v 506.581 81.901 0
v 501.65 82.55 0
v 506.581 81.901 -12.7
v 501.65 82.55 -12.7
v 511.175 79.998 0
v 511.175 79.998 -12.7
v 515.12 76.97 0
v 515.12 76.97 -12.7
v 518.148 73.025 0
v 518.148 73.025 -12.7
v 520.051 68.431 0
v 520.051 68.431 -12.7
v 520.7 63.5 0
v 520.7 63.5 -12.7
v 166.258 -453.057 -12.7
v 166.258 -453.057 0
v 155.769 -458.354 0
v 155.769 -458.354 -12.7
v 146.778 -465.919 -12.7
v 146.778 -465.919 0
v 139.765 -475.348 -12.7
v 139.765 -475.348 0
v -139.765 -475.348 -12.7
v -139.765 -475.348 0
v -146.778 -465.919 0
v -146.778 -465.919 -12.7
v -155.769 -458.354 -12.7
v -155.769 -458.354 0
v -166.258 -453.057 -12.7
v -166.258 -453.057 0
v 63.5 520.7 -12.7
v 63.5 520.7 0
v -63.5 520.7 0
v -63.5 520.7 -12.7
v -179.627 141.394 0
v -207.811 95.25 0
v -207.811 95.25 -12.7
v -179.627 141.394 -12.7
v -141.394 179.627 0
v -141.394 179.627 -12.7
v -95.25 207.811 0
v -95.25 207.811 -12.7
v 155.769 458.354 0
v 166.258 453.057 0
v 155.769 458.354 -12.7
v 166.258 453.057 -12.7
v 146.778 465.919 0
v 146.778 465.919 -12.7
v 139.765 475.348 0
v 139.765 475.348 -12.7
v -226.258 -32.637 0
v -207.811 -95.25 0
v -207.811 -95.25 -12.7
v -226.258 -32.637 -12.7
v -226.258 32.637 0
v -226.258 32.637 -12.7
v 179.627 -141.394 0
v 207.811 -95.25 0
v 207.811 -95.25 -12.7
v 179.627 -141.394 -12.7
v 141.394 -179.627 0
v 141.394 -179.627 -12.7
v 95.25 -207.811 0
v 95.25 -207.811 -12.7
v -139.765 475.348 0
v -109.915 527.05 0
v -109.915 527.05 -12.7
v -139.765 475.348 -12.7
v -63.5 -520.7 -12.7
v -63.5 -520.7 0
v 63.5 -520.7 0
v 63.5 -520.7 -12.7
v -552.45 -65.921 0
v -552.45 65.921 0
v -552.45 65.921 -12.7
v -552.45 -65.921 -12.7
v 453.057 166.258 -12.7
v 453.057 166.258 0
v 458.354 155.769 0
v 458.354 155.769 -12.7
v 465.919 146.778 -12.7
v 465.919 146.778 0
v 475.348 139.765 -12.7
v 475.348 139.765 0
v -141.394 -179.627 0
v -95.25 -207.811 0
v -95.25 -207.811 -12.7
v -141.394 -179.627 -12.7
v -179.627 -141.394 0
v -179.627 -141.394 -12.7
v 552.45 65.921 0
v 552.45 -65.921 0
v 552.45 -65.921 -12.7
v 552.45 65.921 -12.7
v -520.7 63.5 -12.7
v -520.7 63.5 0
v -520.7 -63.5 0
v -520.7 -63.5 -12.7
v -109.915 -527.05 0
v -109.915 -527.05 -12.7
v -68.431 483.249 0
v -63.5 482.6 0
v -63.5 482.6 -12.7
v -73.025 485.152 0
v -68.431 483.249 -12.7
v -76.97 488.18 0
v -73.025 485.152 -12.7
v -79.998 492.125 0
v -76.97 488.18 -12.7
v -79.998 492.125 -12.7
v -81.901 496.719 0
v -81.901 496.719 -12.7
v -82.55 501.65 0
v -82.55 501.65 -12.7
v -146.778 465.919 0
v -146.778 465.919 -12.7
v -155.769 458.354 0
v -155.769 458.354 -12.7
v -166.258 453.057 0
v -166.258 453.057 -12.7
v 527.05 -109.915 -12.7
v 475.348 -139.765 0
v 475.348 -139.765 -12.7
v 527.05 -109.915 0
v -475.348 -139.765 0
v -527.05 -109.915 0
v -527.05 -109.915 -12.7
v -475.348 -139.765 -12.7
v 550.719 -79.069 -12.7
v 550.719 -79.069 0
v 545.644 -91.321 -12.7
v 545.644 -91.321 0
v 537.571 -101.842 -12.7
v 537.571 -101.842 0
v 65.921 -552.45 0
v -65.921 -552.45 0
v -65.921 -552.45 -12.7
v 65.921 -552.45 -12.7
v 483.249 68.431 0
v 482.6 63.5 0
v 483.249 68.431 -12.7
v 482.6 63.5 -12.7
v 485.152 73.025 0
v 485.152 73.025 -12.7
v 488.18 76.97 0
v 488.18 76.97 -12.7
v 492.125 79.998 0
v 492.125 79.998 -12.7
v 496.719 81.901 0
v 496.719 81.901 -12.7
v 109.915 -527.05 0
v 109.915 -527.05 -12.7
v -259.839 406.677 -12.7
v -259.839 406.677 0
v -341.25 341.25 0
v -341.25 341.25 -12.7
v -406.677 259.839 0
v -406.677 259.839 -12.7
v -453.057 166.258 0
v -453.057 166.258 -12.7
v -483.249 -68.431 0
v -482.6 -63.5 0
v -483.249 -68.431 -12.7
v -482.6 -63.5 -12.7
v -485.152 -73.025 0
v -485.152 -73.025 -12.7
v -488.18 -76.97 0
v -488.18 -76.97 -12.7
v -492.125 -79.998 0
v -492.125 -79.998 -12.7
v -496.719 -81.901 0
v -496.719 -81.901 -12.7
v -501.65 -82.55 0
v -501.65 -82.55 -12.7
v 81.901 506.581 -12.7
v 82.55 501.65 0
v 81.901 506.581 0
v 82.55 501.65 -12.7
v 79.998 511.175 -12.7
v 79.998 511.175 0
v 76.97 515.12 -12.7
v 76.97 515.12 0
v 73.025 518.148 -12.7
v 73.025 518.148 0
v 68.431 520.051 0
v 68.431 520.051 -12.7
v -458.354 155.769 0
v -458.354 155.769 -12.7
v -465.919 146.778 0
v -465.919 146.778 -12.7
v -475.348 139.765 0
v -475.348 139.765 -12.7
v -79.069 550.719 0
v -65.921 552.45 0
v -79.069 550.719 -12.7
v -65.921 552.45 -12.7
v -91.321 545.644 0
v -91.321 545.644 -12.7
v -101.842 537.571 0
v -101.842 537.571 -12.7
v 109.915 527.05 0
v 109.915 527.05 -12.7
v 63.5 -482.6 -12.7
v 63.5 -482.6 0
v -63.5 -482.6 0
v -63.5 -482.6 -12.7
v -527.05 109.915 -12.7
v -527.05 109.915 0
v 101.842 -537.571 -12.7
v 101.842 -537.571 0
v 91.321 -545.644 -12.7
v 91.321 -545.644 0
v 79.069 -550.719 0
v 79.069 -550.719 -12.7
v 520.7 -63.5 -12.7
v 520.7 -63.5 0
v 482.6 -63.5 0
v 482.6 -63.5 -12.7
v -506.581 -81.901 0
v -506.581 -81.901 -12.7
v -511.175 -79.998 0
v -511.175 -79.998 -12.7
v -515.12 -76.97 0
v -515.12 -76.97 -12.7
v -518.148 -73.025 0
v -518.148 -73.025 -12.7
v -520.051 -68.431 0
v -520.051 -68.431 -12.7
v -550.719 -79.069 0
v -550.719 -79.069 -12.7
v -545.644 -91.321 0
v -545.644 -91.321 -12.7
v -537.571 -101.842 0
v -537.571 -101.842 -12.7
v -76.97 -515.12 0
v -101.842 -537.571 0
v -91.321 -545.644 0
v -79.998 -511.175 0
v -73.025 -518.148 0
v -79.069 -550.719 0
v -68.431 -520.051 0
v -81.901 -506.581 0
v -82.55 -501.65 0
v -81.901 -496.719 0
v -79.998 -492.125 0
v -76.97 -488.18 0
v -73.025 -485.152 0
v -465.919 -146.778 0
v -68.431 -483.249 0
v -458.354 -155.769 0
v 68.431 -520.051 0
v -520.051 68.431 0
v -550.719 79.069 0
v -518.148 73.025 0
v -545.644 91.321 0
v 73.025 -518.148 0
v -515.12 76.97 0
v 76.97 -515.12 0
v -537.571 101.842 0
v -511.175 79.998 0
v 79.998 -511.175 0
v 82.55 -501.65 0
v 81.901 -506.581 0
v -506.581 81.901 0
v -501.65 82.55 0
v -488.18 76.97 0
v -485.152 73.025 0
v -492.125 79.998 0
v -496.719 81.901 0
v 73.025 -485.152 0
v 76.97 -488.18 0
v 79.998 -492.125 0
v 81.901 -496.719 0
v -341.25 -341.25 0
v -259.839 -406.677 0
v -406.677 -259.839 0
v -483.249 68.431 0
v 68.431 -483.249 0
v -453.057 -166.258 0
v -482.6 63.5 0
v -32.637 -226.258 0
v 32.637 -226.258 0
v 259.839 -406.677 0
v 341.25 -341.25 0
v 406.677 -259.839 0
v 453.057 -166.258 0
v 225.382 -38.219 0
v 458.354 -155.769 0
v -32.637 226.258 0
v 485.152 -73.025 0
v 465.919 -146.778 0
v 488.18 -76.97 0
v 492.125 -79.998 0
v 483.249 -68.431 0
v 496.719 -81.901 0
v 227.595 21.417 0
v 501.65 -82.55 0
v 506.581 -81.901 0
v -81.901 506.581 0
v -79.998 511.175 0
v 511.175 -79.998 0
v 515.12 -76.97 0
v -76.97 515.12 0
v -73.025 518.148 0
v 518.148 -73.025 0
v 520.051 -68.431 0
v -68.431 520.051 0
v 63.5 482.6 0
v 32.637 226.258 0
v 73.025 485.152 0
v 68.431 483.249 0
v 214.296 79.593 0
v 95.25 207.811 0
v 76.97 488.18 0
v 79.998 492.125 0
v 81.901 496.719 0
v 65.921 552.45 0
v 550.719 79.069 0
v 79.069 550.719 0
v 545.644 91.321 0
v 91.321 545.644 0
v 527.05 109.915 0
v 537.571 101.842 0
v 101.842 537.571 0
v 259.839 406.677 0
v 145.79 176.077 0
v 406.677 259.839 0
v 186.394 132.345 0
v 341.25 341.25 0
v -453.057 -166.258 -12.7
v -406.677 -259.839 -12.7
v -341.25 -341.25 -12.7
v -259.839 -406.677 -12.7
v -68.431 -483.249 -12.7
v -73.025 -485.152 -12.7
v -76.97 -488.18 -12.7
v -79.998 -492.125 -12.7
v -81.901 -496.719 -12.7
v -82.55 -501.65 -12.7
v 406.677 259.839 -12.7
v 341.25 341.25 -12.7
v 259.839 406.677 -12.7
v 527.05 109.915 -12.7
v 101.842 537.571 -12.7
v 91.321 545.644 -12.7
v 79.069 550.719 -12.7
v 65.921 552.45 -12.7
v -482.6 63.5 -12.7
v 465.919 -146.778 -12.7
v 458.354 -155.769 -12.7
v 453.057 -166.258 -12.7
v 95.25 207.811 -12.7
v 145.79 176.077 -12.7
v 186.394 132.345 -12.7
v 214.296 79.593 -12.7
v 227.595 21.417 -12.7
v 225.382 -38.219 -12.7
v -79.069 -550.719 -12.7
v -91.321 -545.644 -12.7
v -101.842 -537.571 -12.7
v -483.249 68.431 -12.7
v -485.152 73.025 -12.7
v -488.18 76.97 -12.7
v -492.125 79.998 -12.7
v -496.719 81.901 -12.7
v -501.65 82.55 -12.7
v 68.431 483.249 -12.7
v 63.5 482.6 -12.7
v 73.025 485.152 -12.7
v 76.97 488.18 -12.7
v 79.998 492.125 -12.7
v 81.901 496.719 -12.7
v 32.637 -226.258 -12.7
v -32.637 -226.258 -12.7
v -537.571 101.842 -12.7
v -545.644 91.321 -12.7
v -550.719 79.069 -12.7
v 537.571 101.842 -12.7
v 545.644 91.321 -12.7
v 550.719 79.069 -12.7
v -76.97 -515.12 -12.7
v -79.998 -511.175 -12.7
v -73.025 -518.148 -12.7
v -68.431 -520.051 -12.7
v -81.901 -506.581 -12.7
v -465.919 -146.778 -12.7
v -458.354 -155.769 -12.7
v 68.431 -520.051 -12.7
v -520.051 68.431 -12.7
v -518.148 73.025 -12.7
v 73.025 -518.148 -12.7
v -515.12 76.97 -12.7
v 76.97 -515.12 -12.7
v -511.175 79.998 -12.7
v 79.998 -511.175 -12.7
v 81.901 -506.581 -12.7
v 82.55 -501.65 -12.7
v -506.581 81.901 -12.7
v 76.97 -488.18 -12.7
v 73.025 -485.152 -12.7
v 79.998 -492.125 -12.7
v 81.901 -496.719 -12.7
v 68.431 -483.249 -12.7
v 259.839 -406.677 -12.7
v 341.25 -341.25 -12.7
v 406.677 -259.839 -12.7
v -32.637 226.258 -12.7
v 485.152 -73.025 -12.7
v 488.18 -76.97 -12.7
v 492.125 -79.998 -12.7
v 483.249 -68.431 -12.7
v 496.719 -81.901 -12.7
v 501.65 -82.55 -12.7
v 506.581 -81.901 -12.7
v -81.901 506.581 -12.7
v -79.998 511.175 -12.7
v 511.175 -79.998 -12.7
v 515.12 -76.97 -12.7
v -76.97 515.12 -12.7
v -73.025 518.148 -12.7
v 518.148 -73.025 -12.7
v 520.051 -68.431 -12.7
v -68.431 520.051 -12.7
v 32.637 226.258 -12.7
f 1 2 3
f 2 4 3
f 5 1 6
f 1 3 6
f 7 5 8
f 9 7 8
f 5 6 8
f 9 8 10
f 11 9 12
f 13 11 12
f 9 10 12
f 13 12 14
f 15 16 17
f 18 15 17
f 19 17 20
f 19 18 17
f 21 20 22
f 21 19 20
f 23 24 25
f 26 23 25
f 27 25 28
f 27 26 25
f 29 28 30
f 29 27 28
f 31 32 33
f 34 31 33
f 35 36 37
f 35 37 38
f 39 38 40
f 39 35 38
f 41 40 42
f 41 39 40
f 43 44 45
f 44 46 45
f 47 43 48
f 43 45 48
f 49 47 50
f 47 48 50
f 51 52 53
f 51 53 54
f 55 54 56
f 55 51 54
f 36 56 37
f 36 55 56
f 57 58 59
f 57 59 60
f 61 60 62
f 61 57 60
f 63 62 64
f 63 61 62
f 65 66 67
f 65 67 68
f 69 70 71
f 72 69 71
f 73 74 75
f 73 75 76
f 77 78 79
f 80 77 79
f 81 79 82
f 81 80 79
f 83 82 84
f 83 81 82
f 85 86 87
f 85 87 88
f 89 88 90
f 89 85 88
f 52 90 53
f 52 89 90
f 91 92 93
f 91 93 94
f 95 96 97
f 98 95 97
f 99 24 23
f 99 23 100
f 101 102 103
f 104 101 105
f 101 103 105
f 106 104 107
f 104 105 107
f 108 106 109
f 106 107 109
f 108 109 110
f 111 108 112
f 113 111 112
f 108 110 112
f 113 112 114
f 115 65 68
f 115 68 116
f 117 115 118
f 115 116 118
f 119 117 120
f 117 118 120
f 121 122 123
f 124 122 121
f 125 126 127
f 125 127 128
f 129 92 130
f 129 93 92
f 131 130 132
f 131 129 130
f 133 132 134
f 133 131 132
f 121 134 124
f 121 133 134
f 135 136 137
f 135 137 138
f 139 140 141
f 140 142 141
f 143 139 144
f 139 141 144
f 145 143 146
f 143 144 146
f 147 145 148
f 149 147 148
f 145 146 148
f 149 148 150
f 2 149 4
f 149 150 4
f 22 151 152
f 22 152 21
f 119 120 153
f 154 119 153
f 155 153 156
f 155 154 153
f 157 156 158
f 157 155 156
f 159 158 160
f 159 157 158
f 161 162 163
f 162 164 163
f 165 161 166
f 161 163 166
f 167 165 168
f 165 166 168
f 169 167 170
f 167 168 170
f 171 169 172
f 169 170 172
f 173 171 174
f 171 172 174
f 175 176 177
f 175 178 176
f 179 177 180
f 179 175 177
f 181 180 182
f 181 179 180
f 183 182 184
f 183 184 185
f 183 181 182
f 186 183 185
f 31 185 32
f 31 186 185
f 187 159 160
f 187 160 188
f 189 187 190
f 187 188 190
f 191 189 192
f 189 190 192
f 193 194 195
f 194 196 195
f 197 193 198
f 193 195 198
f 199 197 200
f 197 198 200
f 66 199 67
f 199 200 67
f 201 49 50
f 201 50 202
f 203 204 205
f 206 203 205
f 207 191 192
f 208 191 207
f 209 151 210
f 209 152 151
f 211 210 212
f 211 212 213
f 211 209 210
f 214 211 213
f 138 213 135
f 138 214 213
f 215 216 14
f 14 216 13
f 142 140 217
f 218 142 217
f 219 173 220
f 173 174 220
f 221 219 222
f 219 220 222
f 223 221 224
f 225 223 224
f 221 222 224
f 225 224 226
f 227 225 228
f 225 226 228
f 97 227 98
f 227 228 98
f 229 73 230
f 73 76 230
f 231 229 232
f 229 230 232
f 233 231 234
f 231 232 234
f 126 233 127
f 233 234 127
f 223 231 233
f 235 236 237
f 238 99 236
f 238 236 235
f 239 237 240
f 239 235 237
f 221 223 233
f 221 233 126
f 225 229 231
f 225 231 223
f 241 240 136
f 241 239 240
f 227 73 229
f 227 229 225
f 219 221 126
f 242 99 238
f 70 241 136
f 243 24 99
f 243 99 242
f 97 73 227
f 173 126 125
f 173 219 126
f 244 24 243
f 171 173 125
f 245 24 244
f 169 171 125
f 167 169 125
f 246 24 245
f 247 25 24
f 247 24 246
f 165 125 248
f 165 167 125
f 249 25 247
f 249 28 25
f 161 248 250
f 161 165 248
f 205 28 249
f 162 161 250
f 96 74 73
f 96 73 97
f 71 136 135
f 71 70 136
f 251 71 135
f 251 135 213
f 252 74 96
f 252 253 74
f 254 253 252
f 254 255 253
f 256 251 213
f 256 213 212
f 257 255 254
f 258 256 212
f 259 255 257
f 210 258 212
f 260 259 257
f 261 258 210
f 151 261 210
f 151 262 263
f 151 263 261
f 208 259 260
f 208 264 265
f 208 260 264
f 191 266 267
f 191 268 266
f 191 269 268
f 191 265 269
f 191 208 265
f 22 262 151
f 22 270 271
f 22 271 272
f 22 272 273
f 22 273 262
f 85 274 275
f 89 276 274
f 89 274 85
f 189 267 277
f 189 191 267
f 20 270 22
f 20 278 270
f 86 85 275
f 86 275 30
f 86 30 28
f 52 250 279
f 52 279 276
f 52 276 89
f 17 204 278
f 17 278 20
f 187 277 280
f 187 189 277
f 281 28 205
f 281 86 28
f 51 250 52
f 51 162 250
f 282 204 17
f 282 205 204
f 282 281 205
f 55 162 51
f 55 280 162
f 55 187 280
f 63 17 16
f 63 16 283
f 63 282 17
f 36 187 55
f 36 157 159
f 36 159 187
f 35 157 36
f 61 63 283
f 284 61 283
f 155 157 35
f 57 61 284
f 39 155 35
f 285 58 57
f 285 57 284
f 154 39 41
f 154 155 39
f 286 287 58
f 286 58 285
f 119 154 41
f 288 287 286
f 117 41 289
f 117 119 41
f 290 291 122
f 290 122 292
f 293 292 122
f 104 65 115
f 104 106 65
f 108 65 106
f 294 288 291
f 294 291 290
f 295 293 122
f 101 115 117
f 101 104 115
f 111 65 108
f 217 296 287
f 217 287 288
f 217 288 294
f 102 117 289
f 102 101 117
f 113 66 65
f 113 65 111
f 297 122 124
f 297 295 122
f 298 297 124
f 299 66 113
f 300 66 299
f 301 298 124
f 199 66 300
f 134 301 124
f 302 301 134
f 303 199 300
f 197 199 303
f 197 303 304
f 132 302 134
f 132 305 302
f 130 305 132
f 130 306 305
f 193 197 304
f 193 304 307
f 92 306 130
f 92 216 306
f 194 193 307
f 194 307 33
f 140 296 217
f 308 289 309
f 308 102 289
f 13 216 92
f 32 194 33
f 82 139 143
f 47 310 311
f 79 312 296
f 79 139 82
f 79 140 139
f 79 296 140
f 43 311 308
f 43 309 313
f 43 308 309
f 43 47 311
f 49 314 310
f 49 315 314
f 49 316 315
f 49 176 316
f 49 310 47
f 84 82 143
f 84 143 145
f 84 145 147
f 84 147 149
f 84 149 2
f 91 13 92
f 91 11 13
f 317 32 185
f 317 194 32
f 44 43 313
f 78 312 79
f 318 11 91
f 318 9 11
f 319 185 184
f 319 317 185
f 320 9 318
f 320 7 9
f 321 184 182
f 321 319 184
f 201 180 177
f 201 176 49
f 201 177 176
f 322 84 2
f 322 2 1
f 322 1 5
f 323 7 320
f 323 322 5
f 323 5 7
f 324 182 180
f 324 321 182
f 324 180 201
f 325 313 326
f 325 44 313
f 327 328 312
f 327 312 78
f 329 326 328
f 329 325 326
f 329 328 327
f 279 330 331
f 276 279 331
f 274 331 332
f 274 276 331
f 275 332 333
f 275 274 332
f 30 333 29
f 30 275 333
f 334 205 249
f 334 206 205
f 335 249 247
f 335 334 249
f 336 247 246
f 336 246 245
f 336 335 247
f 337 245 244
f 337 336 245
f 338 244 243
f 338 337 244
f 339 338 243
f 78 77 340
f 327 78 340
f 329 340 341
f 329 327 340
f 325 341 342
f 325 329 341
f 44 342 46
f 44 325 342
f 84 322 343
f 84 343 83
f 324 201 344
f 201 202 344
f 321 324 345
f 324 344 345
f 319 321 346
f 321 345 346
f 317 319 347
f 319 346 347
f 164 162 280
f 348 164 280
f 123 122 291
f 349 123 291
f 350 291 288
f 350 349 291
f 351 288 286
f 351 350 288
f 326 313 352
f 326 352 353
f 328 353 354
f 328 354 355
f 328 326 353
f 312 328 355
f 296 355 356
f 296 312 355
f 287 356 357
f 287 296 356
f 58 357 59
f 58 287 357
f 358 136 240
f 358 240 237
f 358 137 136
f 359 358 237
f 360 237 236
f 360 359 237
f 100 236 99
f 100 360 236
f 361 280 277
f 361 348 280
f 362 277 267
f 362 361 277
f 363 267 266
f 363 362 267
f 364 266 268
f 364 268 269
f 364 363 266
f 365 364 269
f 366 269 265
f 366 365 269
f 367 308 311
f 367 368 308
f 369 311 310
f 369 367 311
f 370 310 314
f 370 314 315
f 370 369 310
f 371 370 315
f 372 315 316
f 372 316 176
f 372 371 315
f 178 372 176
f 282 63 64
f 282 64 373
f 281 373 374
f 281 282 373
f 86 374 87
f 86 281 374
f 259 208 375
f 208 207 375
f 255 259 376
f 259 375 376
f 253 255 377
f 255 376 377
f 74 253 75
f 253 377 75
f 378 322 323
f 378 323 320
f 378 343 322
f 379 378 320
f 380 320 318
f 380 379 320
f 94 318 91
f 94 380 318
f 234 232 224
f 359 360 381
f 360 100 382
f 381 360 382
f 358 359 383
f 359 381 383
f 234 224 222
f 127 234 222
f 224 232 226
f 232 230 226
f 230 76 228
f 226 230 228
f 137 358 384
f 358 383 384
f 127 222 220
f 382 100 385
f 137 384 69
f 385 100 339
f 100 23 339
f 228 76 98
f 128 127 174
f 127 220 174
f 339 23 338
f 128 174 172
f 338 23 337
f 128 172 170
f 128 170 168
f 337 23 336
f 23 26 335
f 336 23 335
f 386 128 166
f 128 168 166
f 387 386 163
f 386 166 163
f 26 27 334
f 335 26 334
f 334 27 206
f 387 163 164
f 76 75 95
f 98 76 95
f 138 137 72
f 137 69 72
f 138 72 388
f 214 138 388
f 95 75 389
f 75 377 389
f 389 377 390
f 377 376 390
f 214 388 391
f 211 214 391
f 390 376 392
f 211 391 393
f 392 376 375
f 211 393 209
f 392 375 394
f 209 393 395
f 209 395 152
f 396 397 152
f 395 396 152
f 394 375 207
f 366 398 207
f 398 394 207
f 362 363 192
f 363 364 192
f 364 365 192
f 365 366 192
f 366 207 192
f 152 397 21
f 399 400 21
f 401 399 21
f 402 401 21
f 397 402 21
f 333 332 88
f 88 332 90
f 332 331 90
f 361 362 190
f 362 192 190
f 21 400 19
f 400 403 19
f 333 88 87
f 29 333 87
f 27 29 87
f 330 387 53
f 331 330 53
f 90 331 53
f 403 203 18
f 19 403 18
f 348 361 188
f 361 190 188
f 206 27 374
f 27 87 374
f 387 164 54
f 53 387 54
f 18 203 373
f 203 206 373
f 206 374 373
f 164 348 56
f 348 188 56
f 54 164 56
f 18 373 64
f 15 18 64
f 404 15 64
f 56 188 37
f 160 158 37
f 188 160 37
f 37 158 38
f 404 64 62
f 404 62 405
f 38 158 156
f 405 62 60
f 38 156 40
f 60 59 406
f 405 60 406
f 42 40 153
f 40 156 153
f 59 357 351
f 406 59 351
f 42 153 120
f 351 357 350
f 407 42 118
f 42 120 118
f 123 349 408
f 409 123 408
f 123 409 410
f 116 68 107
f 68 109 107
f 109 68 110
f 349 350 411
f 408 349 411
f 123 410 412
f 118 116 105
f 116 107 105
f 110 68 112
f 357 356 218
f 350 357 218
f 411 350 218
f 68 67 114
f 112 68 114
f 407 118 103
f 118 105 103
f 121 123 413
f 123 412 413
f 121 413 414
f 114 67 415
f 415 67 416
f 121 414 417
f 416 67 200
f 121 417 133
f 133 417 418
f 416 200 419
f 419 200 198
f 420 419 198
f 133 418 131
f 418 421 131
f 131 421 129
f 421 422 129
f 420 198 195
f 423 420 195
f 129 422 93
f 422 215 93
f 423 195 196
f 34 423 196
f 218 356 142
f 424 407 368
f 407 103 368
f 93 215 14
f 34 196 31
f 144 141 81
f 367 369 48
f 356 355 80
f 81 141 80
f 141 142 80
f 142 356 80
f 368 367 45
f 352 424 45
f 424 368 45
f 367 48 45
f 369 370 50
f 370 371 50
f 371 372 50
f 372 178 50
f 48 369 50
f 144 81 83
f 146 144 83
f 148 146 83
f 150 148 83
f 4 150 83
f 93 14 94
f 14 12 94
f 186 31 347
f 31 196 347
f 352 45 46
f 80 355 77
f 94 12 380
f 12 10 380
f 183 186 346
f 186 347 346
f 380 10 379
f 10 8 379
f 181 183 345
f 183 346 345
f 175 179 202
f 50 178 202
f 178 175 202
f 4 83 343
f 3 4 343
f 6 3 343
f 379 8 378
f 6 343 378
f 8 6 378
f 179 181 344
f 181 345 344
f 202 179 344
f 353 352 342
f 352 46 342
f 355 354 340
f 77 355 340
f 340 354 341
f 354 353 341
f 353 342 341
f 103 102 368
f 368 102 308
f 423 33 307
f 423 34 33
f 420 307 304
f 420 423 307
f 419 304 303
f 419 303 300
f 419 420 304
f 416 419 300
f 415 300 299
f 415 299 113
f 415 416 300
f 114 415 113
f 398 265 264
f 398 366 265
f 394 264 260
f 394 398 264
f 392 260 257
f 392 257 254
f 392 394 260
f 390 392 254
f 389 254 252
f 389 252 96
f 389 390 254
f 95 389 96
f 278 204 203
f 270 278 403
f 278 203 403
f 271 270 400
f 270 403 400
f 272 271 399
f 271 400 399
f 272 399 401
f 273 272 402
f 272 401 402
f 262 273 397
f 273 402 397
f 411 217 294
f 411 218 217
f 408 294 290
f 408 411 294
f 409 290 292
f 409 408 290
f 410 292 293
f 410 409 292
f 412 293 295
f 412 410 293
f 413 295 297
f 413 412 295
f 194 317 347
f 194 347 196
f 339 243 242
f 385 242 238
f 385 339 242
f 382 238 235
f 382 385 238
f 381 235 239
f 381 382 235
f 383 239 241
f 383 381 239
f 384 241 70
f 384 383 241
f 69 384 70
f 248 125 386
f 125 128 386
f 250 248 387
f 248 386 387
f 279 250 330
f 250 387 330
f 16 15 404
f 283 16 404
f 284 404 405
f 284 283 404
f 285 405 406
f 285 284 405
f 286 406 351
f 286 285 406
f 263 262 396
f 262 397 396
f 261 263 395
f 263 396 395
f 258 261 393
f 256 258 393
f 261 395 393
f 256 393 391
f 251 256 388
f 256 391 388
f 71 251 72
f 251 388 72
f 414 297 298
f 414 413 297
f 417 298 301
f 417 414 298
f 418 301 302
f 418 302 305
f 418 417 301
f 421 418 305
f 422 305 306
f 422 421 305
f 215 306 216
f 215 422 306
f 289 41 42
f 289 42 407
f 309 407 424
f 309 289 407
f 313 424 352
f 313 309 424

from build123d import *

# Parameters (mm, degrees)
F1_DEPTH        = 12.7
F2_DEPTH        = 25.4
F2_COPIES_COUNT = 4
F3_R            = 19.04999
F5_R            = 50.8


# Not quite as in the source:
# - a fillet or chamfer is up to 0.001 mm smaller than in the source, because OpenCascade refuses the exact size
# - a feature of the source that left no trace in its solid (it failed there, or was rolled back) is left out
# - a pattern or mirror of a feature is missing from the dataset's text; its kind, count and spacing are read off the source's solid


with BuildPart() as f1:
    # F0 (on Top) → F1 (new body)
    with BuildSketch(Plane.XY):
        with BuildLine():
            Line((552.45, 95.25), (473.1069620075, 95.25))
            ThreePointArc((473.1069620075, 95.25), (480.2208761939, 47.8609451179), (482.6, 0))
            ThreePointArc((482.6, 0), (480.2208761939, -47.8609451179), (473.1069620075, -95.25))
            Line((473.1069620075, -95.25), (552.45, -95.25))
            Line((552.45, -95.25), (552.45, 95.25))
        make_face()
        with BuildLine():
            Line((-207.8109657838, 95.25), (-473.1069620075, 95.25))
            ThreePointArc((-473.1069620075, 95.25), (-480.2208762804, 47.8609442495), (-482.6, -1.7456e-06))
            ThreePointArc((-482.6, -1.7456e-06), (-480.2208761073, -47.8609459864), (-473.1069620075, -95.25))
            Line((-473.1069620075, -95.25), (-207.8109657838, -95.25))
            ThreePointArc((-207.8109657838, -95.25), (-228.6, 0), (-207.8109657838, 95.25))
        make_face()
        with BuildLine():
            Line((473.1069620075, 95.25), (207.8109657838, 95.25))
            ThreePointArc((207.8109657838, 95.25), (223.3422785527, 48.7461445748), (228.6, 0))
            ThreePointArc((228.6, 0), (223.3422785527, -48.7461445748), (207.8109657838, -95.25))
            Line((207.8109657838, -95.25), (473.1069620075, -95.25))
            ThreePointArc((473.1069620075, -95.25), (480.2208761939, -47.8609451179), (482.6, 0))
            ThreePointArc((482.6, 0), (480.2208761939, 47.8609451179), (473.1069620075, 95.25))
        make_face()
        with BuildLine():
            ThreePointArc((-458.9465033909, 149.2342689375), (-466.8077665522, 122.4470052167), (-473.1069620075, 95.25))
            Line((-473.1069620075, 95.25), (-207.8109657838, 95.25))
            ThreePointArc((-207.8109657838, 95.25), (-161.6446101792, 161.6446101792), (-95.25, 207.8109657838))
            Line((-95.25, 207.8109657838), (-95.25, 473.1069620075))
            ThreePointArc((-95.25, 473.1069620075), (-122.4470052167, 466.8077665522), (-149.2342689375, 458.9465033909))
            ThreePointArc((-149.2342689375, 458.9465033909), (-341.2497326006, 341.2497326006), (-458.9465033909, 149.2342689375))
        make_face()
        with BuildLine():
            Line((-95.25, 473.1069620075), (-95.25, 207.8109657838))
            ThreePointArc((-95.25, 207.8109657838), (0, 228.6), (95.25, 207.8109657838))
            Line((95.25, 207.8109657838), (95.25, 473.1069620075))
            ThreePointArc((95.25, 473.1069620075), (0, 482.6), (-95.25, 473.1069620075))
        make_face()
        with BuildLine():
            Line((95.25, 473.1069620075), (95.25, 207.8109657838))
            ThreePointArc((95.25, 207.8109657838), (161.6446101792, 161.6446101792), (207.8109657838, 95.25))
            Line((207.8109657838, 95.25), (473.1069620075, 95.25))
            ThreePointArc((473.1069620075, 95.25), (466.8077665522, 122.4470052167), (458.9465033909, 149.2342689375))
            ThreePointArc((458.9465033909, 149.2342689375), (341.2497326006, 341.2497326006), (149.2342689375, 458.9465033909))
            ThreePointArc((149.2342689375, 458.9465033909), (122.4470052167, 466.8077665522), (95.25, 473.1069620075))
        make_face()
        with BuildLine():
            Line((-95.25, 552.45), (-95.25, 473.1069620075))
            ThreePointArc((-95.25, 473.1069620075), (0, 482.6), (95.25, 473.1069620075))
            Line((95.25, 473.1069620075), (95.25, 552.45))
            Line((95.25, 552.45), (-95.25, 552.45))
        make_face()
        with BuildLine():
            ThreePointArc((207.8109657838, -95.25), (161.6446101792, -161.6446101792), (95.25, -207.8109657838))
            Line((95.25, -207.8109657838), (95.25, -473.1069620075))
            ThreePointArc((95.25, -473.1069620075), (122.4470052167, -466.8077665522), (149.2342689375, -458.9465033909))
            ThreePointArc((149.2342689375, -458.9465033909), (341.2497326006, -341.2497326006), (458.9465033909, -149.2342689375))
            ThreePointArc((458.9465033909, -149.2342689375), (466.8077665522, -122.4470052167), (473.1069620075, -95.25))
            Line((473.1069620075, -95.25), (207.8109657838, -95.25))
        make_face()
        with BuildLine():
            ThreePointArc((95.25, -207.8109657838), (0, -228.6), (-95.25, -207.8109657838))
            Line((-95.25, -207.8109657838), (-95.25, -473.1069620075))
            ThreePointArc((-95.25, -473.1069620075), (0, -482.6), (95.25, -473.1069620075))
            Line((95.25, -473.1069620075), (95.25, -207.8109657838))
        make_face()
        with BuildLine():
            Line((-207.8109657838, -95.25), (-473.1069620075, -95.25))
            ThreePointArc((-473.1069620075, -95.25), (-466.8077665522, -122.4470052167), (-458.9465033909, -149.2342689375))
            ThreePointArc((-458.9465033909, -149.2342689375), (-341.2497326006, -341.2497326006), (-149.2342689375, -458.9465033909))
            ThreePointArc((-149.2342689375, -458.9465033909), (-122.4470052167, -466.8077665522), (-95.25, -473.1069620075))
            Line((-95.25, -473.1069620075), (-95.25, -207.8109657838))
            ThreePointArc((-95.25, -207.8109657838), (-161.6446101792, -161.6446101792), (-207.8109657838, -95.25))
        make_face()
        with BuildLine():
            ThreePointArc((95.25, -473.1069620075), (0, -482.6), (-95.25, -473.1069620075))
            Line((-95.25, -473.1069620075), (-95.25, -552.45))
            Line((-95.25, -552.45), (95.25, -552.45))
            Line((95.25, -552.45), (95.25, -473.1069620075))
        make_face()
        with BuildLine():
            Line((-473.1069620075, 95.25), (-552.45, 95.25))
            Line((-552.45, 95.25), (-552.45, -95.25))
            Line((-552.45, -95.25), (-473.1069620075, -95.25))
            ThreePointArc((-473.1069620075, -95.25), (-480.2208761073, -47.8609459864), (-482.6, -1.7456e-06))
            ThreePointArc((-482.6, -1.7456e-06), (-480.2208762804, 47.8609442495), (-473.1069620075, 95.25))
        make_face()
        Polygon((-482.6, 82.55), (-482.6, -1.7456e-06), (-482.6, -82.55), (-520.7, -82.55), (-520.7, 82.55), align=None, mode=Mode.SUBTRACT)
        Polygon((-482.6, -82.55), (-482.6, -1.7456e-06), (-482.6, 82.55), (-520.7, 82.55), (-520.7, -82.55), align=None)
        with BuildLine():
            Line((-458.9465033909, 149.2342689375), (-552.45, 95.25))
            Line((-552.45, 95.25), (-473.1069620075, 95.25))
            ThreePointArc((-473.1069620075, 95.25), (-466.8077665522, 122.4470052167), (-458.9465033909, 149.2342689375))
        make_face()
        with BuildLine():
            Line((-473.1069620075, -95.25), (-552.45, -95.25))
            Line((-552.45, -95.25), (-458.9465033909, -149.2342689375))
            ThreePointArc((-458.9465033909, -149.2342689375), (-466.8077665522, -122.4470052167), (-473.1069620075, -95.25))
        make_face()
        with BuildLine():
            Line((-95.25, 552.45), (-149.2342689375, 458.9465033909))
            ThreePointArc((-149.2342689375, 458.9465033909), (-122.4470052167, 466.8077665522), (-95.25, 473.1069620075))
            Line((-95.25, 473.1069620075), (-95.25, 552.45))
        make_face()
        with BuildLine():
            Line((95.25, 552.45), (95.25, 473.1069620075))
            ThreePointArc((95.25, 473.1069620075), (122.4470052167, 466.8077665522), (149.2342689375, 458.9465033909))
            Line((149.2342689375, 458.9465033909), (95.25, 552.45))
        make_face()
        with BuildLine():
            ThreePointArc((458.9465033909, 149.2342689375), (466.8077665522, 122.4470052167), (473.1069620075, 95.25))
            Line((473.1069620075, 95.25), (552.45, 95.25))
            Line((552.45, 95.25), (458.9465033909, 149.2342689375))
        make_face()
        with BuildLine():
            Line((552.45, -95.25), (473.1069620075, -95.25))
            ThreePointArc((473.1069620075, -95.25), (466.8077665522, -122.4470052167), (458.9465033909, -149.2342689375))
            Line((458.9465033909, -149.2342689375), (552.45, -95.25))
        make_face()
        with BuildLine():
            ThreePointArc((149.2342689375, -458.9465033909), (122.4470052167, -466.8077665522), (95.25, -473.1069620075))
            Line((95.25, -473.1069620075), (95.25, -552.45))
            Line((95.25, -552.45), (149.2342689375, -458.9465033909))
        make_face()
        with BuildLine():
            ThreePointArc((-95.25, -473.1069620075), (-122.4470052167, -466.8077665522), (-149.2342689375, -458.9465033909))
            Line((-149.2342689375, -458.9465033909), (-95.25, -552.45))
            Line((-95.25, -552.45), (-95.25, -473.1069620075))
        make_face()
    extrude(amount=-F1_DEPTH)

    # F0 (on Top) → F2 (cut)
    with BuildSketch(Plane.XY):
        Polygon((-482.6, -82.55), (-482.6, -1.7456e-06), (-482.6, 82.55), (-520.7, 82.55), (-520.7, -82.55), align=None)
    f2 = extrude(amount=-F2_DEPTH, mode=Mode.SUBTRACT)

    # F2_copies: F2 ×4 about axis
    f2_copies_axis = Axis((0, 0, 0), (0, 0, 1))
    for i in range(1, F2_COPIES_COUNT):
        add(f2.rotate(f2_copies_axis, i * 360 / F2_COPIES_COUNT), mode=Mode.SUBTRACT)

    # F3 (radius 19.05 in the source; OpenCascade refuses exactly that, so slightly less here)
    f3_edges = [f1.edges().sort_by_distance(p)[0] for p in [
        (-520.7, -82.55, -6.35),
        (-482.6, -82.55, -6.35),
        (-520.7, 82.55, -6.35),
        (-482.6, 82.55, -6.35),
        (-82.55, -520.7, -6.35),
        (-82.55, -482.6, -6.35),
        (82.55, -482.6, -6.35),
        (82.55, -520.7, -6.35),
        (520.7, -82.55, -6.35),
        (482.6, -82.55, -6.35),
        (482.6, 82.55, -6.35),
        (520.7, 82.55, -6.35),
        (82.55, 520.7, -6.35),
        (82.55, 482.6, -6.35),
        (-82.55, 520.7, -6.35),
        (-82.55, 482.6, -6.35),
    ]]
    fillet(f3_edges, radius=F3_R)

    # F5
    f5_edges = [f1.edges().sort_by_distance(p)[0] for p in [
        (-149.234269, -458.946503, -6.35),
        (-95.25, -552.45, -6.35),
        (95.25, -552.45, -6.35),
        (149.234269, -458.946503, -6.35),
        (458.946503, -149.234269, -6.35),
        (552.45, -95.25, -6.35),
        (552.45, 95.25, -6.35),
        (458.946503, 149.234269, -6.35),
        (149.234269, 458.946503, -6.35),
        (95.25, 552.45, -6.35),
        (-95.25, 552.45, -6.35),
        (-149.234269, 458.946503, -6.35),
        (-458.946503, 149.234269, -6.35),
        (-552.45, 95.25, -6.35),
        (-552.45, -95.25, -6.35),
        (-458.946503, -149.234269, -6.35),
    ]]
    fillet(f5_edges, radius=F5_R)


solid = f1.part
